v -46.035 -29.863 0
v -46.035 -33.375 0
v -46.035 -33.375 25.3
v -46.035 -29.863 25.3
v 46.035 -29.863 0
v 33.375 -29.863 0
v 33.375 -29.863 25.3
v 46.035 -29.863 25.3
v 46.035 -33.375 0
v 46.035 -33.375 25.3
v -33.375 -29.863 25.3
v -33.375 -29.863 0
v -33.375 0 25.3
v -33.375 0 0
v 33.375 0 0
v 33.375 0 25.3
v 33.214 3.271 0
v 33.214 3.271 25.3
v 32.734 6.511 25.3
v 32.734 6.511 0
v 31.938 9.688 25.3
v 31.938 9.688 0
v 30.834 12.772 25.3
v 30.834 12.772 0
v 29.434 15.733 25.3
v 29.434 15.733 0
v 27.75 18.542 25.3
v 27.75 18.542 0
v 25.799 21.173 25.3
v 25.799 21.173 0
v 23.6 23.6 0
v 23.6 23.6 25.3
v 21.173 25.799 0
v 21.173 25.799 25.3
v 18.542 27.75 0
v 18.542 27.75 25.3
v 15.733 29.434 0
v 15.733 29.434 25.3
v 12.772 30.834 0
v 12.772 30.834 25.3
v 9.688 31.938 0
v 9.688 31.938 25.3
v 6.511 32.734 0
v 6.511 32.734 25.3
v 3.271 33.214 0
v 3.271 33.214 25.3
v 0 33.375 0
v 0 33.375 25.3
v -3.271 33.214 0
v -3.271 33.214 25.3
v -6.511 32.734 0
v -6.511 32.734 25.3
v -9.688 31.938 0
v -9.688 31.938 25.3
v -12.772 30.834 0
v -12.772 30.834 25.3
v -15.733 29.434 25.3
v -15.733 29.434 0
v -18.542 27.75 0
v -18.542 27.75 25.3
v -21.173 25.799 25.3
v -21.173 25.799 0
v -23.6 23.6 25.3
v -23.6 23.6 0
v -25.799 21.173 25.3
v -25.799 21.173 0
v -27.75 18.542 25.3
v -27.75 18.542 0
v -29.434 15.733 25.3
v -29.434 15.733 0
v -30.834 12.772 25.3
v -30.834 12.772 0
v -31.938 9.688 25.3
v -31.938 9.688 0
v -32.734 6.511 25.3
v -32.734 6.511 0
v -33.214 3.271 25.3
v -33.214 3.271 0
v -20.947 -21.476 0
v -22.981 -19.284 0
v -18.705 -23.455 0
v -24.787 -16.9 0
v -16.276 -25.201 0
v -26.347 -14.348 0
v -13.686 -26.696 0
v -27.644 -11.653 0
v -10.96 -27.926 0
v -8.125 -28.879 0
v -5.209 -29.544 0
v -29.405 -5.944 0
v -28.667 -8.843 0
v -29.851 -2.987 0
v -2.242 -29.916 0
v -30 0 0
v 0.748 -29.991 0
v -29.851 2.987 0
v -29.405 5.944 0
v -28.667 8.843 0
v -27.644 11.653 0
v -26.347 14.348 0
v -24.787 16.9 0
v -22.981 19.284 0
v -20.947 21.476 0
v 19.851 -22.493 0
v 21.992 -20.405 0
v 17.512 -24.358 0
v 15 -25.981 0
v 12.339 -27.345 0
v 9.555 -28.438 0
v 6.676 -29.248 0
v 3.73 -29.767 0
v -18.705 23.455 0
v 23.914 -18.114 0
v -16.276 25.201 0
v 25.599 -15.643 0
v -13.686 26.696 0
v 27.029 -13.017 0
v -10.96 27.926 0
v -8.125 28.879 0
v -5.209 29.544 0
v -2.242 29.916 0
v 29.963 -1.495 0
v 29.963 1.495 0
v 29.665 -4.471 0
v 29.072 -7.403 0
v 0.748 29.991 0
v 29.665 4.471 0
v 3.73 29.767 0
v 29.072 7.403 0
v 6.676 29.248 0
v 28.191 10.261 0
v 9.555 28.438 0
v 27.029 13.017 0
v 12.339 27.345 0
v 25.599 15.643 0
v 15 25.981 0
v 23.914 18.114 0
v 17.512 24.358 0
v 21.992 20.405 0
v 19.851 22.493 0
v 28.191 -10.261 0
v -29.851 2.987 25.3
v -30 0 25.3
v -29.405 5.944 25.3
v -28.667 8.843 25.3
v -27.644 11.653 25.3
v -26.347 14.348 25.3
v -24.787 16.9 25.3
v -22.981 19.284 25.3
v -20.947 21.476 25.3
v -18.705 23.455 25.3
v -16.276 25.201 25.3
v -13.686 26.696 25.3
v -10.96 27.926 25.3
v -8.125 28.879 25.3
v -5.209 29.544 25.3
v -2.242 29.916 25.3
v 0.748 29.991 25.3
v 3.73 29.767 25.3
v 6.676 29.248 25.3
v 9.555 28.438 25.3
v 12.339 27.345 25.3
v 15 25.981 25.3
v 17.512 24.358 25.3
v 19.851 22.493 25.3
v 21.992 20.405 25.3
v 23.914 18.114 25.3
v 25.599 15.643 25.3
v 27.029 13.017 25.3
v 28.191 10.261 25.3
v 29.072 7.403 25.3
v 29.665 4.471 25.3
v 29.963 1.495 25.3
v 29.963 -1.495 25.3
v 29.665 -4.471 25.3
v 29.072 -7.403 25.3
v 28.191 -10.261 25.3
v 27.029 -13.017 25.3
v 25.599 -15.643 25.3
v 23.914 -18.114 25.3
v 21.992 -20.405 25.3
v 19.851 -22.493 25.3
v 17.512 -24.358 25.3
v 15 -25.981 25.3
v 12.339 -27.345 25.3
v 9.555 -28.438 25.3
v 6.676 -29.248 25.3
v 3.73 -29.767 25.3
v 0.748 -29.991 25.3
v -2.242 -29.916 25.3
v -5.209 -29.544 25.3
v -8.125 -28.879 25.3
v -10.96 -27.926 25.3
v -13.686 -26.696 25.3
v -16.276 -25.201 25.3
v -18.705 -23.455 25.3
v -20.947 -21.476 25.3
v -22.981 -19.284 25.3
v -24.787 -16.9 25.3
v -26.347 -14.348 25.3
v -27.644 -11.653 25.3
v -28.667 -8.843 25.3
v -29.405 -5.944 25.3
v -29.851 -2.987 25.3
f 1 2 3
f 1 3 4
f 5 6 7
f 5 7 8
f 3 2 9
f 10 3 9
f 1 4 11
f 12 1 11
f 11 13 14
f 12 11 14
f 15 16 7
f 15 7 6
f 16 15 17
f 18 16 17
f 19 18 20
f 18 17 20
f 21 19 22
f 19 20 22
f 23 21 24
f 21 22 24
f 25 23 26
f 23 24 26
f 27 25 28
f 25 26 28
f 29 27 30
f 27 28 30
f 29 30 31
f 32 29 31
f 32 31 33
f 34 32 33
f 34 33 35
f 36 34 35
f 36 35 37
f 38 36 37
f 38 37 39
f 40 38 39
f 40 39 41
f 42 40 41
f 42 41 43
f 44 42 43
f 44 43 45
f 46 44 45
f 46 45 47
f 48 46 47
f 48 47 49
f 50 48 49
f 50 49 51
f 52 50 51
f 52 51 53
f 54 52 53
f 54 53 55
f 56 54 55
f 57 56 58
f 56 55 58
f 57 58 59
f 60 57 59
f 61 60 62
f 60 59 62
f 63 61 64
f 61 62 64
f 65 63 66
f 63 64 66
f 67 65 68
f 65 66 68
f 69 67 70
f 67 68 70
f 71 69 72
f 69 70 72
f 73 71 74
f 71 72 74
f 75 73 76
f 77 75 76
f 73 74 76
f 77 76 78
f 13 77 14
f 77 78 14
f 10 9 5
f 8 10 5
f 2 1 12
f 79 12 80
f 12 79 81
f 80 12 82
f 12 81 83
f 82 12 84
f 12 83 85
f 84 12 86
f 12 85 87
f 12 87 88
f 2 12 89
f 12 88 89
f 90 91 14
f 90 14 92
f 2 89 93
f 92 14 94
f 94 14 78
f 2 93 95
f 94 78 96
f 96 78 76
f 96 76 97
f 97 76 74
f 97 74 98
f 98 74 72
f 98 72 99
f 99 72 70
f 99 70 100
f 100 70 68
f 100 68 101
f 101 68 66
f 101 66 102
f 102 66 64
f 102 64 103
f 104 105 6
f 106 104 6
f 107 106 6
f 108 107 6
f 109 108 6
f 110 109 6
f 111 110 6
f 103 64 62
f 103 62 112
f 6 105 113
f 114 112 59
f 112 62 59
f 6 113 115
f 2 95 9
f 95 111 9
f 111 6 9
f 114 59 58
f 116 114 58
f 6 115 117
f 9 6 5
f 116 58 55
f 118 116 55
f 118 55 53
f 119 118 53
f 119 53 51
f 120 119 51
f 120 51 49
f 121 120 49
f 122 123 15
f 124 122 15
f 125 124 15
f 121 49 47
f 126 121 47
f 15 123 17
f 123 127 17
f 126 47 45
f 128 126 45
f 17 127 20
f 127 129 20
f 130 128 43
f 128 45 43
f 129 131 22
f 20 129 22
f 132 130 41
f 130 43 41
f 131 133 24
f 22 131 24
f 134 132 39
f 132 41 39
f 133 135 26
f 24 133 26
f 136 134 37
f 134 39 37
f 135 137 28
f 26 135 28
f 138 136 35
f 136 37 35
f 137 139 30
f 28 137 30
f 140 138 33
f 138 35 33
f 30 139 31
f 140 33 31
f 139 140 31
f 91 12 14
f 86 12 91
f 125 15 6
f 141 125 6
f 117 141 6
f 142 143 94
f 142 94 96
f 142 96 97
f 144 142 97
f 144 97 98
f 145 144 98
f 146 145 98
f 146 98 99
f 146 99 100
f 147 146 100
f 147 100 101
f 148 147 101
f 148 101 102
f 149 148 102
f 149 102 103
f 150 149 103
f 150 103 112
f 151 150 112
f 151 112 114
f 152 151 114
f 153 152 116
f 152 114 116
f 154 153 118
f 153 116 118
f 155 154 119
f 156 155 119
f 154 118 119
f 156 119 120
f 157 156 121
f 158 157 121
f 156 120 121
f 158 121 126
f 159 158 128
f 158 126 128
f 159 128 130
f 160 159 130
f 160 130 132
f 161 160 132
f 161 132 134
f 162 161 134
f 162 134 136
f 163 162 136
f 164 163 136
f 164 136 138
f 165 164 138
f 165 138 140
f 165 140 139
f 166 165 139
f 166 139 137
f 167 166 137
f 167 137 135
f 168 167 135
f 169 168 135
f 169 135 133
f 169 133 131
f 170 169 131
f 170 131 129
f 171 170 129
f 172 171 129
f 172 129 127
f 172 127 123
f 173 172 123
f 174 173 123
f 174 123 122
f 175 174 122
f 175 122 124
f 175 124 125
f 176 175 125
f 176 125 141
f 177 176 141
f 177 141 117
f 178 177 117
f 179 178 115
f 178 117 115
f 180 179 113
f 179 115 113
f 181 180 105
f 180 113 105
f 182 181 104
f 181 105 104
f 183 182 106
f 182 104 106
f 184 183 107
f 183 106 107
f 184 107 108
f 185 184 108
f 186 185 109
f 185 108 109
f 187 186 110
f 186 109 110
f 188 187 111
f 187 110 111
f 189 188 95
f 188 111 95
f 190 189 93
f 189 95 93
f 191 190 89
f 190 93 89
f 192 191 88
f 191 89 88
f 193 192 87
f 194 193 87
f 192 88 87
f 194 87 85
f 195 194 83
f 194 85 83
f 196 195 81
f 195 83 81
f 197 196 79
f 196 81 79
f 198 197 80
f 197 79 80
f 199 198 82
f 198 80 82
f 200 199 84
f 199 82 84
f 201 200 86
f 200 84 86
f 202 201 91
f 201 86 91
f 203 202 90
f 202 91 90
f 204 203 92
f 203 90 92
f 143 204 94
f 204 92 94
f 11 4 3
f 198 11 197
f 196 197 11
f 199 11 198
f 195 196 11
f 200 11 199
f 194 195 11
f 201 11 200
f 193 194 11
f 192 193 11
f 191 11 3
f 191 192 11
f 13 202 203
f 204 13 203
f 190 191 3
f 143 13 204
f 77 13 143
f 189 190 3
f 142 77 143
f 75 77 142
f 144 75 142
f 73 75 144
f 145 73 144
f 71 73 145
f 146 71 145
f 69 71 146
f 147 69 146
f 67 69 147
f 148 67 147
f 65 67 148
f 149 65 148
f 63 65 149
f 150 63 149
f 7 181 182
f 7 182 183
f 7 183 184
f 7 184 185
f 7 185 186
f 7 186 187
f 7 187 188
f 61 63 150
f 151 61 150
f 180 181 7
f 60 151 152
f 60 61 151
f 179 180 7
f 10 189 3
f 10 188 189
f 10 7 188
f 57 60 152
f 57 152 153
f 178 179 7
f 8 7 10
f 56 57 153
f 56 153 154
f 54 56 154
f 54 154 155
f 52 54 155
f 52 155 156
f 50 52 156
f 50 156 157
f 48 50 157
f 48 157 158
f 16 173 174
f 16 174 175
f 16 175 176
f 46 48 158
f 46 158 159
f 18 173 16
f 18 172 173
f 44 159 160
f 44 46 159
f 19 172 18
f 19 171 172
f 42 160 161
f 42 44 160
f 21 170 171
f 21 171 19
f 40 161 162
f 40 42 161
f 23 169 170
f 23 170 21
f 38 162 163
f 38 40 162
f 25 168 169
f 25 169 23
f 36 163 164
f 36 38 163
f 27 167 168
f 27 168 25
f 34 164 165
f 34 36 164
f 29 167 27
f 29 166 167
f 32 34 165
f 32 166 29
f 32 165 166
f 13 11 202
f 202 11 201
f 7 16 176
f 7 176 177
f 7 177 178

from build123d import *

# Parameters (mm, degrees)
SKETCH1_R           = 33.375
SKETCH1_R_2         = 30.007470458
BOSS_EXTRUDE1_DEPTH = 25.3
BASE_W              = 92.07
BASE_H              = 3.511684016
BOSS_EXTRUDE3_DEPTH = 25.3
SKETCH7_W           = 66.75
SKETCH7_H           = 25.3
BOSS_EXTRUDE4_DEPTH = 33.3
SKETCH2_R           = 30
CUT_EXTRUDE4_DEPTH  = 33.3


with BuildPart() as part:
    # Sketch1 → Boss-Extrude1 (new body)
    with BuildSketch(Plane.XY):
        Circle(SKETCH1_R)
        Circle(SKETCH1_R_2, mode=Mode.SUBTRACT)
        Circle(SKETCH1_R_2)
    extrude(amount=BOSS_EXTRUDE1_DEPTH)

    # Base → Boss-Extrude3 (add)
    with BuildSketch(Plane.XY):
        with Locations((0, -31.619157992)):
            Rectangle(BASE_W, BASE_H)
    extrude(amount=BOSS_EXTRUDE3_DEPTH)

    # Sketch7 → Boss-Extrude4 (add)
    with BuildSketch(Plane(origin=(0, 0, 0), x_dir=(1, 0, 0), z_dir=(0, 1, 0))):
        with Locations((0, -12.65)):
            Rectangle(SKETCH7_W, SKETCH7_H)
    extrude(amount=-BOSS_EXTRUDE4_DEPTH)

    # Sketch2 → Cut-Extrude4 (cut)
    with BuildSketch(Plane(origin=(0, 0, 0), x_dir=(-1, 0, 0), z_dir=(0, 0, -1))):
        Circle(SKETCH2_R)
    extrude(amount=-CUT_EXTRUDE4_DEPTH, mode=Mode.SUBTRACT)


solid = part.part
